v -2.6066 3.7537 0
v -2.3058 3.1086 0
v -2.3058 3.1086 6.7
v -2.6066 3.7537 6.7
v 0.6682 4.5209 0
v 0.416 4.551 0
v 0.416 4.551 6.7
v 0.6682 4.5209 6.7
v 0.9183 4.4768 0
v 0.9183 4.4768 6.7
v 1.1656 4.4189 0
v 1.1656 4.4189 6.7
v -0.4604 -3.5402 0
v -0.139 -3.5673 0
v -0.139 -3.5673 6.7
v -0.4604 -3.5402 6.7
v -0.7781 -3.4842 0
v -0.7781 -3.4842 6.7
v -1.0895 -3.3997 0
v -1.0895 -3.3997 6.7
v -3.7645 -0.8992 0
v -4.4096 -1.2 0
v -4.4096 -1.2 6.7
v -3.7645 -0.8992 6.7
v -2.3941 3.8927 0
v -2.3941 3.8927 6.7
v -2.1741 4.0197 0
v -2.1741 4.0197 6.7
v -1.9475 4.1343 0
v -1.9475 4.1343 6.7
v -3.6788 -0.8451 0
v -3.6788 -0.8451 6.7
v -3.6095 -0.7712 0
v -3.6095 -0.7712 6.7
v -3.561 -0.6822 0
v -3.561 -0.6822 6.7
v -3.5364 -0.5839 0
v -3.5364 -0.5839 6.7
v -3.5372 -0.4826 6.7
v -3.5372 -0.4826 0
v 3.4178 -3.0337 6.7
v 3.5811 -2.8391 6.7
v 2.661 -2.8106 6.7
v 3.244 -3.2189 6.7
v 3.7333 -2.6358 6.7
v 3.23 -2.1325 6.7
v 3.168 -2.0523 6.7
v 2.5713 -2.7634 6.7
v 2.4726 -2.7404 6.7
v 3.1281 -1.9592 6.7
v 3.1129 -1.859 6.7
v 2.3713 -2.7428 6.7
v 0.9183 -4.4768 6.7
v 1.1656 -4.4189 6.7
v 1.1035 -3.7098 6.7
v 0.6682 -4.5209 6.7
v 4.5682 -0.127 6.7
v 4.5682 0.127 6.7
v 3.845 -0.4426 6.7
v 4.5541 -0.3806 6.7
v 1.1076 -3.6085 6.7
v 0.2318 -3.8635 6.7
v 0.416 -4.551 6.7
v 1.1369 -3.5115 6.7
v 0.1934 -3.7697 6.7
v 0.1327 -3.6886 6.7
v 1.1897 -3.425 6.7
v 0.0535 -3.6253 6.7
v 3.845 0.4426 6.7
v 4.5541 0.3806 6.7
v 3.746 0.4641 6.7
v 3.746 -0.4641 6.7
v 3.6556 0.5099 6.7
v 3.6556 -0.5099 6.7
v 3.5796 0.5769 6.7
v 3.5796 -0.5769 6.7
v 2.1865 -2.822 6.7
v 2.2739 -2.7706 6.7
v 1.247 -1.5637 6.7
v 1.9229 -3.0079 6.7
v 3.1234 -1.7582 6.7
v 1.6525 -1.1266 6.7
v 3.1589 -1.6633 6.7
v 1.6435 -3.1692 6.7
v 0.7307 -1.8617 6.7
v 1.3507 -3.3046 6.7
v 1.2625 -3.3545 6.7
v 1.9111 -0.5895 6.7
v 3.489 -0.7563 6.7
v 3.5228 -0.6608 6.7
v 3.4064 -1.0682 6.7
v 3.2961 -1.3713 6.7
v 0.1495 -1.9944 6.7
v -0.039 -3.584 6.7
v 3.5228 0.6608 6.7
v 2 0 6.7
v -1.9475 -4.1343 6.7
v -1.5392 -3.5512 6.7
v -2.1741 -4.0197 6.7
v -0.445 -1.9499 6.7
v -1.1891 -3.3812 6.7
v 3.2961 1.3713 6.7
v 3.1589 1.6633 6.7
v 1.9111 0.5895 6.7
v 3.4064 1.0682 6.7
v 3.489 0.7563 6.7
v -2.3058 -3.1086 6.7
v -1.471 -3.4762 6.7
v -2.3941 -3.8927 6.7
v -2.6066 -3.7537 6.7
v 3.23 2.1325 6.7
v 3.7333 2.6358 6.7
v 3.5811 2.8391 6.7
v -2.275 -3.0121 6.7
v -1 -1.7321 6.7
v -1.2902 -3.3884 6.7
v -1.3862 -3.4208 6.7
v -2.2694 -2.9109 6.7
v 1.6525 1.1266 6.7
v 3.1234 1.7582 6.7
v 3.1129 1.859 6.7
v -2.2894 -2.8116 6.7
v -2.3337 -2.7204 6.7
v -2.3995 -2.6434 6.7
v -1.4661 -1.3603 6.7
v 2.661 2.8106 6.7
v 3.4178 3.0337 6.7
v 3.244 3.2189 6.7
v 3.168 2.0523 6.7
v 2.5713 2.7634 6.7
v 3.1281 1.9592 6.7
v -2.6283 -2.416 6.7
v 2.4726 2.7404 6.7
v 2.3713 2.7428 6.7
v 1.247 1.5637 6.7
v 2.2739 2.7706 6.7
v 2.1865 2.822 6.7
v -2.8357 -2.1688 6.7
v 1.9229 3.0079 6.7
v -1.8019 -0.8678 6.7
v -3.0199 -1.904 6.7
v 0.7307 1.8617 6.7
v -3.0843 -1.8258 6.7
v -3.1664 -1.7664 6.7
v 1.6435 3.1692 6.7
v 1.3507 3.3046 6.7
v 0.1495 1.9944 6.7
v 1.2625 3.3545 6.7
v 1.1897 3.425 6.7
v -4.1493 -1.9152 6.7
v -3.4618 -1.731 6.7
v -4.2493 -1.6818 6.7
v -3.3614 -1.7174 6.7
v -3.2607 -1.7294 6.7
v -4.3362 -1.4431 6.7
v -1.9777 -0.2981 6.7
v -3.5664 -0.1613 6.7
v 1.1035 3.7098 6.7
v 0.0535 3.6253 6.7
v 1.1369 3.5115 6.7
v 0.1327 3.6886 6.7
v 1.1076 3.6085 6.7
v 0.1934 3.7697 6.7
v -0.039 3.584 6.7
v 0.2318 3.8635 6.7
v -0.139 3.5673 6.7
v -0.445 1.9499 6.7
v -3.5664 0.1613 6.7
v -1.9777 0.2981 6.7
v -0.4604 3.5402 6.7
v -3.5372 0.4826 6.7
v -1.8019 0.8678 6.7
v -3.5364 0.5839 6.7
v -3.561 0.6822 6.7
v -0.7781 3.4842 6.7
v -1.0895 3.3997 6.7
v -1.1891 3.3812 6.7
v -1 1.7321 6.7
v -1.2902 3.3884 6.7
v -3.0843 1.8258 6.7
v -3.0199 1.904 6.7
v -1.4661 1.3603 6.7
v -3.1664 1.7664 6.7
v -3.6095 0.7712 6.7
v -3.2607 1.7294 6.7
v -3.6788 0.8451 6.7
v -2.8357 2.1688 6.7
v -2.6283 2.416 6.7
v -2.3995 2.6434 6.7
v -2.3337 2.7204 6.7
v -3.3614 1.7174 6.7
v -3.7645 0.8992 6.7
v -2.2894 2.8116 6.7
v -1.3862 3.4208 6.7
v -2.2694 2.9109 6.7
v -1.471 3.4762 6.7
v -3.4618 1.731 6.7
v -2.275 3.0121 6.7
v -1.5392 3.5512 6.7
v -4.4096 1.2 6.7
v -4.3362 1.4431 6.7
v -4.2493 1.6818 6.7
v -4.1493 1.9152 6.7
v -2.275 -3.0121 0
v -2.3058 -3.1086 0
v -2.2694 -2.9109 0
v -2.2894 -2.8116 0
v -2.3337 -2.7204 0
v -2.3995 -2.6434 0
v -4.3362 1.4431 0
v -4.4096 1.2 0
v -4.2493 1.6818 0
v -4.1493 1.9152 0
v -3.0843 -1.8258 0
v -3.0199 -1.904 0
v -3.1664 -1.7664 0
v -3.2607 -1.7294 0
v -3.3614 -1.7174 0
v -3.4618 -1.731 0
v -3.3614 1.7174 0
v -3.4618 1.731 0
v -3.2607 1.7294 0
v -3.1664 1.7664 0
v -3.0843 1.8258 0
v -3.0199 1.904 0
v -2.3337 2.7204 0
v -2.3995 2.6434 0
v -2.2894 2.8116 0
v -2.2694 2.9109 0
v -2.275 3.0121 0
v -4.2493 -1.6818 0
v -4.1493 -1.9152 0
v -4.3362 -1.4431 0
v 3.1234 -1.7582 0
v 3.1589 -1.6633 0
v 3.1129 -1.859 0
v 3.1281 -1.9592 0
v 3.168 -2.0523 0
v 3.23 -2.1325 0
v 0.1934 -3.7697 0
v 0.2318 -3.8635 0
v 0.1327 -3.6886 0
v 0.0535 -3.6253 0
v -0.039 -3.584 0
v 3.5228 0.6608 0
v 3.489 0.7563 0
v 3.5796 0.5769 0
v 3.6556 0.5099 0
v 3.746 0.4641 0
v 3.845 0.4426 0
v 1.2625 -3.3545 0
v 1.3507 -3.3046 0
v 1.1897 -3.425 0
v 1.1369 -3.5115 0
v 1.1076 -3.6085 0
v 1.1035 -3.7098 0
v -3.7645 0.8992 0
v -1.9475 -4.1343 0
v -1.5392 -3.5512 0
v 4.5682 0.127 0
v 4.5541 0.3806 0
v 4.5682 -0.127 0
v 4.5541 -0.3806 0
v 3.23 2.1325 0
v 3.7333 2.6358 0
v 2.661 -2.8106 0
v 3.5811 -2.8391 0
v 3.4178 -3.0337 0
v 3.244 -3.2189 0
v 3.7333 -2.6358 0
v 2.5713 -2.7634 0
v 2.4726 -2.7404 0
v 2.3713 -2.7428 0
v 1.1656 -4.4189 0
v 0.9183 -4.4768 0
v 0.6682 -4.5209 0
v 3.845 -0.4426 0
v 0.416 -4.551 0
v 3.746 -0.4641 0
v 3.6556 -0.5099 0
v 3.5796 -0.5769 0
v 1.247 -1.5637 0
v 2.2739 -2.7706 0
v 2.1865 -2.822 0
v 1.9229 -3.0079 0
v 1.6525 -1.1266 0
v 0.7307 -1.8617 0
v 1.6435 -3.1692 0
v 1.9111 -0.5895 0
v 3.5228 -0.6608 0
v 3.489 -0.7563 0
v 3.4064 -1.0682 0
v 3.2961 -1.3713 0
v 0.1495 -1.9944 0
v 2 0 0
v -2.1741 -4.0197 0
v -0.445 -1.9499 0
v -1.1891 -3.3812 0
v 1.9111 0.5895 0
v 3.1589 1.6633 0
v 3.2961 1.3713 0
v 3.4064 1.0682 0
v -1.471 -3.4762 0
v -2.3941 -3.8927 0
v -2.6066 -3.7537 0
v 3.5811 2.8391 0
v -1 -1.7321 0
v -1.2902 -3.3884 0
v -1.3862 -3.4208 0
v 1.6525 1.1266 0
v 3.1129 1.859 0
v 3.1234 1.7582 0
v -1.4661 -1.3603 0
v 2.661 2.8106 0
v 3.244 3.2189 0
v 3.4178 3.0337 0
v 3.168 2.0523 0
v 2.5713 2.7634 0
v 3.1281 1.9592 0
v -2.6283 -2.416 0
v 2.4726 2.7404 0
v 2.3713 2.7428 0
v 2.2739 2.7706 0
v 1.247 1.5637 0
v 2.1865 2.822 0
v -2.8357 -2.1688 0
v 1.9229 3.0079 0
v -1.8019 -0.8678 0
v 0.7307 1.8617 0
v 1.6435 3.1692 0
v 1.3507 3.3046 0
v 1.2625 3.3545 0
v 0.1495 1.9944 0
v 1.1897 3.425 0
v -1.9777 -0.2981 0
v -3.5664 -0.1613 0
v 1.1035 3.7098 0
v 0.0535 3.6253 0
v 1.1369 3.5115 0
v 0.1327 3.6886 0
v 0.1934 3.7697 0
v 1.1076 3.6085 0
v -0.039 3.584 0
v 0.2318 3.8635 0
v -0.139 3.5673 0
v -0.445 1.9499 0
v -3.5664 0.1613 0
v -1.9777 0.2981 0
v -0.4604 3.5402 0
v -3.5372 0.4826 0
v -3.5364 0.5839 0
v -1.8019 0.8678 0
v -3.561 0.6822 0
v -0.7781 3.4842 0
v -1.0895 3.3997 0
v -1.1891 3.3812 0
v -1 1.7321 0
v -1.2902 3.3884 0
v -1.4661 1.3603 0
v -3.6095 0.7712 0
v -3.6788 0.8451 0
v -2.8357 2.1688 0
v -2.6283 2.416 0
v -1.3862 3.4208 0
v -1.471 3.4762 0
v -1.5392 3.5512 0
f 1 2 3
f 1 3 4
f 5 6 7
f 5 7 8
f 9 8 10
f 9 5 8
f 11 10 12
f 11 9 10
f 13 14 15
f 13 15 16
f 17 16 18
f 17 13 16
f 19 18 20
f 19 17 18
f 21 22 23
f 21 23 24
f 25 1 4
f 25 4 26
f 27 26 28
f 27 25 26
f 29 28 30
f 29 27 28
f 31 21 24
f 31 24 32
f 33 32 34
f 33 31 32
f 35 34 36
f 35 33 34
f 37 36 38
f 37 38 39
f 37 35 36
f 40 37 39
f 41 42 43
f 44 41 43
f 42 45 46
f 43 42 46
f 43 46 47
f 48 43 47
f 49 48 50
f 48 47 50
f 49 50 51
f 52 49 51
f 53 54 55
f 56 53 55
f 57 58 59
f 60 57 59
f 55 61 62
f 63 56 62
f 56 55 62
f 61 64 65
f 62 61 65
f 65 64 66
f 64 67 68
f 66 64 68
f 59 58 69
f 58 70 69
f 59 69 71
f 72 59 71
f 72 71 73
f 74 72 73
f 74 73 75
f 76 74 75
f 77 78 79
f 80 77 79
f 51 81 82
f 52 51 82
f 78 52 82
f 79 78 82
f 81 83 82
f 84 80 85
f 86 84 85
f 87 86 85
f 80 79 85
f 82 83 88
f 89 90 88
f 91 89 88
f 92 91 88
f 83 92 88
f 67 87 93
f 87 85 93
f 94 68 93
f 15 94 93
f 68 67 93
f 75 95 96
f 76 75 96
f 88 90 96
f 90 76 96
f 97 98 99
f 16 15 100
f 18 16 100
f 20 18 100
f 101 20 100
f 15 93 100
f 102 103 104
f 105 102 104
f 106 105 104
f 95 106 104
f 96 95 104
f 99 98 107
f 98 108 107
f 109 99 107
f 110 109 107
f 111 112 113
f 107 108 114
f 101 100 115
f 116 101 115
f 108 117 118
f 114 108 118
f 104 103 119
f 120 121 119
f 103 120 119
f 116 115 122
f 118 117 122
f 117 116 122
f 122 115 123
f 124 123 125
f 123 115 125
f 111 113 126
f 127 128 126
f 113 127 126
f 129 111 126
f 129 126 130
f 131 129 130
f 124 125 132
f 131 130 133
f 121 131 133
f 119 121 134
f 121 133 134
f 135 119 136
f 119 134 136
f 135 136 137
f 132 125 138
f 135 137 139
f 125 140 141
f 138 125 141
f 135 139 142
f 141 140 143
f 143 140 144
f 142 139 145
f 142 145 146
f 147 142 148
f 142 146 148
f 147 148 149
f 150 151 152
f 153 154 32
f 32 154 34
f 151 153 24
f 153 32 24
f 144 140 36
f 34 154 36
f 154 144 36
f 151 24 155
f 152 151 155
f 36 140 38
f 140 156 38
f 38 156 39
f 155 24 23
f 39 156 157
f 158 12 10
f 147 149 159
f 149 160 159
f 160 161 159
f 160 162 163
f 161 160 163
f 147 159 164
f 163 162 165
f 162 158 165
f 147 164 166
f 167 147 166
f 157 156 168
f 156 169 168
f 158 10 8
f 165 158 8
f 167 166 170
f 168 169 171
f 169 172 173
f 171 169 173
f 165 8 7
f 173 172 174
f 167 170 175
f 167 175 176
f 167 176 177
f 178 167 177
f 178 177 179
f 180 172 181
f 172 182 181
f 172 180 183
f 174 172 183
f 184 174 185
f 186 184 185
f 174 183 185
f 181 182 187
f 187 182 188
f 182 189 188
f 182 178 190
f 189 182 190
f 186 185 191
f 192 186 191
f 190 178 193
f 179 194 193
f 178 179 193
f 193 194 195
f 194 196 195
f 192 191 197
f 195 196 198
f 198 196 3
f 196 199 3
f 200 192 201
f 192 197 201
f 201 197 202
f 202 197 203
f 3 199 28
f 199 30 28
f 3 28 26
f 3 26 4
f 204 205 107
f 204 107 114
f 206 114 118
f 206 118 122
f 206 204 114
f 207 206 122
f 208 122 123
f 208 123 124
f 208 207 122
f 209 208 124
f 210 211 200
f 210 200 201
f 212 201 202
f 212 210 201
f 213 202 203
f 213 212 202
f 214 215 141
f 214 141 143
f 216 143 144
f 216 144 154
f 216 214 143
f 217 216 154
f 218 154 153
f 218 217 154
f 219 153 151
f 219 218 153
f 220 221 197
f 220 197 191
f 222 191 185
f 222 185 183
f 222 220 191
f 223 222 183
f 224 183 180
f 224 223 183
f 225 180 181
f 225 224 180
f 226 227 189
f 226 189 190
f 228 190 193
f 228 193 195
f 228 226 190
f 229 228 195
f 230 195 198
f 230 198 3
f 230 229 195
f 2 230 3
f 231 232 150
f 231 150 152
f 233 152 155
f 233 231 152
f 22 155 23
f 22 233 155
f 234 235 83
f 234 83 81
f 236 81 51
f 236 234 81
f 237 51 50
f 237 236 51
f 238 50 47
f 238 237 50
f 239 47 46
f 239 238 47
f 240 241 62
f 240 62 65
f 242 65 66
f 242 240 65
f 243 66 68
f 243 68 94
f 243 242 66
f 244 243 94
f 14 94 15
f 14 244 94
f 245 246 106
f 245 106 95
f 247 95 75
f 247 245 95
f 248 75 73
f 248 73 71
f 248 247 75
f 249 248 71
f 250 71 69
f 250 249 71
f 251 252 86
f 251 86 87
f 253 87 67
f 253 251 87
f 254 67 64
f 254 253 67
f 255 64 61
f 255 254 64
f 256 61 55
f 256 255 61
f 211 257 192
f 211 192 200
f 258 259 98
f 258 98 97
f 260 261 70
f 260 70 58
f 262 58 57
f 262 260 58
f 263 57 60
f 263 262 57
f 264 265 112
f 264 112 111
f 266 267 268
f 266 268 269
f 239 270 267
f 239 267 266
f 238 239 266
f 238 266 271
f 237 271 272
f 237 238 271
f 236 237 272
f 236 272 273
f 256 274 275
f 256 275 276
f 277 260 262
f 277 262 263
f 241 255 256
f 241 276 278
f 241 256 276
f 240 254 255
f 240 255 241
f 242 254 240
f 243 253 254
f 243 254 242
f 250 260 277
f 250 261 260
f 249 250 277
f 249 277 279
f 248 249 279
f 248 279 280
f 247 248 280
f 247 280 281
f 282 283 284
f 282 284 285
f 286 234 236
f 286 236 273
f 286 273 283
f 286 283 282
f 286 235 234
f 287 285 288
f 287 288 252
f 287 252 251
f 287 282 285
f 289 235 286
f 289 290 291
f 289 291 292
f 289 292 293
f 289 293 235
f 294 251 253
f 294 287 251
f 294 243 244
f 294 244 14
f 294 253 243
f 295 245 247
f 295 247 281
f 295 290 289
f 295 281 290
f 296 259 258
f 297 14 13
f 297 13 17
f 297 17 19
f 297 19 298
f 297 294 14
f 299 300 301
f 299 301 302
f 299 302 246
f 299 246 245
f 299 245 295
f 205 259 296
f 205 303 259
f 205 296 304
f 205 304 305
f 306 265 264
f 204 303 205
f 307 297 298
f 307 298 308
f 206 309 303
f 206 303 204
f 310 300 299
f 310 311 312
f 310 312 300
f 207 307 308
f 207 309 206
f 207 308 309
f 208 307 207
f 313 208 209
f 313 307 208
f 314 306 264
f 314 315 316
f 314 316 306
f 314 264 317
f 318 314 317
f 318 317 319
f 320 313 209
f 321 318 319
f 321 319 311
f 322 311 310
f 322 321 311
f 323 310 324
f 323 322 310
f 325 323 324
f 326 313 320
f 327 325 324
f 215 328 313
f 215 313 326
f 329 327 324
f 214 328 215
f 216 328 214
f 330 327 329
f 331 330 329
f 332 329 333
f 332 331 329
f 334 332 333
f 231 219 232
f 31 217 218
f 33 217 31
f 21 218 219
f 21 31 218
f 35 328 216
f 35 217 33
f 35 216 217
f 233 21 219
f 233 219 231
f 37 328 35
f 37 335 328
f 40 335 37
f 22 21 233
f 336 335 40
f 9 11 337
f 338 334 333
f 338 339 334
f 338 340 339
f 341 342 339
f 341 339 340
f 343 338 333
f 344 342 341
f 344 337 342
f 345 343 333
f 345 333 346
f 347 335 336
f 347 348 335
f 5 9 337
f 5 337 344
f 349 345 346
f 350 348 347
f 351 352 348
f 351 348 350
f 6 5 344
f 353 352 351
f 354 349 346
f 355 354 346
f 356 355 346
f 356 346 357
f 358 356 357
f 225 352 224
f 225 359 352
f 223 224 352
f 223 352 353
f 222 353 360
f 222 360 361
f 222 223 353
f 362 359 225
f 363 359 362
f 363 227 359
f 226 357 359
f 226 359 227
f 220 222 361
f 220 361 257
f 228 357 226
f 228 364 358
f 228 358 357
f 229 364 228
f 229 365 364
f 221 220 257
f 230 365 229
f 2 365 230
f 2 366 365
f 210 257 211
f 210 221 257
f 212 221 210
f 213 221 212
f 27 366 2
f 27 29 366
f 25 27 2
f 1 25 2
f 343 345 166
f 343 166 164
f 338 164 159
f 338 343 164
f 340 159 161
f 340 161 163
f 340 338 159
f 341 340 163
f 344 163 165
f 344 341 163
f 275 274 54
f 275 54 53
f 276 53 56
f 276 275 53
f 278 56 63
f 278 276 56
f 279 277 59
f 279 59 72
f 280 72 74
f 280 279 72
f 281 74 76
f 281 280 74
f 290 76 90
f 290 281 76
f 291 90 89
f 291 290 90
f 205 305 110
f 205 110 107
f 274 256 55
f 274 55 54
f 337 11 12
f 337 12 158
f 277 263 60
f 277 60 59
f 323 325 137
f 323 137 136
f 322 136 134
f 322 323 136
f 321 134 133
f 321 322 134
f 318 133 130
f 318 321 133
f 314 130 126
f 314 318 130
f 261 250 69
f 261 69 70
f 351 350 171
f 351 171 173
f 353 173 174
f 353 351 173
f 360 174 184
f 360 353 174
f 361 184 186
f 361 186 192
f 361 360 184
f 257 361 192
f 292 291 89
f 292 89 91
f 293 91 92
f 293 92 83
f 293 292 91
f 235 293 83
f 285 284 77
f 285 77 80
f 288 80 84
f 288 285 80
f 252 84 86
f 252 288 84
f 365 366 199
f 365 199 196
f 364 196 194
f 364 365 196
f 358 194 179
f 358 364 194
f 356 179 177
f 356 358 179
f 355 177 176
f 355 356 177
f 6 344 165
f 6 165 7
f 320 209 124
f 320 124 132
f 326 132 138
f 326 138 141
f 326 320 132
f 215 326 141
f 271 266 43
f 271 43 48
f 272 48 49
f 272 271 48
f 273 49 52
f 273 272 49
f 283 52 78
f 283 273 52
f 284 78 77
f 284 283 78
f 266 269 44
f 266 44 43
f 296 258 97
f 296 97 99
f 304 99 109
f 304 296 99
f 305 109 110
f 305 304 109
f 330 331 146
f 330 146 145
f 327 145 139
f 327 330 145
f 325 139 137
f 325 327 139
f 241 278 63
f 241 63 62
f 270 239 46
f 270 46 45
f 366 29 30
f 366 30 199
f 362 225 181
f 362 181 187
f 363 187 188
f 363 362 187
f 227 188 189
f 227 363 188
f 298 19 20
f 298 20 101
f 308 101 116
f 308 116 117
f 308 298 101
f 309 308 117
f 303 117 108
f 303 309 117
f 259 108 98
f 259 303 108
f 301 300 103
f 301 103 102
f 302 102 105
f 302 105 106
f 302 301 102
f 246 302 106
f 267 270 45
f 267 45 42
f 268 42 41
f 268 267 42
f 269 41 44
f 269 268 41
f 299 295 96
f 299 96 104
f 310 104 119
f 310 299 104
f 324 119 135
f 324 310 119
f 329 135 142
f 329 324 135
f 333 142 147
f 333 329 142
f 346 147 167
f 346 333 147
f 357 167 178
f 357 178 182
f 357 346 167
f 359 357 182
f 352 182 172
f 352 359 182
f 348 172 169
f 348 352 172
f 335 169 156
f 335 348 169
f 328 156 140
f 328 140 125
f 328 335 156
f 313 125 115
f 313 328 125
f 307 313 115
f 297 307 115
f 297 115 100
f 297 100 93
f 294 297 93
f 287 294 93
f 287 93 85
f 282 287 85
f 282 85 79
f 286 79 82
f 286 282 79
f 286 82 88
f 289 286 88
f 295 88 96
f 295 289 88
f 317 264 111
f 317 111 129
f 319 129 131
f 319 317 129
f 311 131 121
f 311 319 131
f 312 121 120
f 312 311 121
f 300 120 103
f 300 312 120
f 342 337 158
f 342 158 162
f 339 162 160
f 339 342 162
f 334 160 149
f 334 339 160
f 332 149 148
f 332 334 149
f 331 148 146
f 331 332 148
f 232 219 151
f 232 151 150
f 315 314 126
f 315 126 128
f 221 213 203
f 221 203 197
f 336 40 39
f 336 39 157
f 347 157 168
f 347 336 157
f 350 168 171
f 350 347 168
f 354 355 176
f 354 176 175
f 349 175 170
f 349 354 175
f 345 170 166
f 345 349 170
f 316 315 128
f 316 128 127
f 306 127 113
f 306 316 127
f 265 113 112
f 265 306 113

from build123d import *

# Parameters (mm, degrees)
SKETCH2_R           = 2
BOSS_EXTRUDE1_DEPTH = 6.7


with BuildPart() as part:
    # Sketch2 → Boss-Extrude1 (new body)
    with BuildSketch(Plane.XY):
        with BuildLine():
            Line((-4.409637173, -1.2), (-3.764514138, -0.899174188))
            ThreePointArc((-3.764514138, -0.899174188), (-3.582420347, -0.728223333), (-3.537232834, -0.482580436))
            ThreePointArc((-3.537232834, -0.482580436), (-3.57, 0), (-3.537232834, 0.482580436))
            ThreePointArc((-3.537232834, 0.482580436), (-3.582420347, 0.728223333), (-3.764514138, 0.899174188))
            Line((-3.764514138, 0.899174188), (-4.409637173, 1.2))
            ThreePointArc((-4.409637173, 1.2), (-4.294395277, 1.563032055), (-4.149323184, 1.915206806))
            Line((-4.149323184, 1.915206806), (-3.461763164, 1.730975654))
            ThreePointArc((-3.461763164, 1.730975654), (-3.212386135, 1.744883974), (-3.019874282, 1.904011377))
            ThreePointArc((-3.019874282, 1.904011377), (-2.734778662, 2.294751767), (-2.399480831, 2.6433675))
            ThreePointArc((-2.399480831, 2.6433675), (-2.276200264, 2.860586849), (-2.305807109, 3.108590435))
            Line((-2.305807109, 3.108590435), (-2.606632921, 3.75371347))
            ThreePointArc((-2.606632921, 3.75371347), (-2.285, 3.957736095), (-1.947494763, 4.134267063))
            Line((-1.947494763, 4.134267063), (-1.539214732, 3.55118275))
            ThreePointArc((-1.539214732, 3.55118275), (-1.339240749, 3.401540677), (-1.089482991, 3.399695106))
            ThreePointArc((-1.089482991, 3.399695106), (-0.619923994, 3.515763678), (-0.13898508, 3.567293533))
            ThreePointArc((-0.13898508, 3.567293533), (0.095079219, 3.654449987), (0.231812692, 3.863462669))
            Line((0.231812692, 3.863462669), (0.416043844, 4.551022689))
            ThreePointArc((0.416043844, 4.551022689), (0.793572172, 4.500571431), (1.165588102, 4.418857814))
            Line((1.165588102, 4.418857814), (1.10354938, 3.709751971))
            ThreePointArc((1.10354938, 3.709751971), (1.160550267, 3.466578694), (1.3506895, 3.304623712))
            ThreePointArc((1.3506895, 3.304623712), (1.785, 3.091710692), (2.186543334, 2.822043275))
            ThreePointArc((2.186543334, 2.822043275), (2.421870079, 2.738355361), (2.660964759, 2.810577782))
            Line((2.660964759, 2.810577782), (3.244049071, 3.218857814))
            ThreePointArc((3.244049071, 3.218857814), (3.500823105, 2.937539376), (3.73327934, 2.635815883))
            Line((3.73327934, 2.635815883), (3.229950472, 2.132487015))
            ThreePointArc((3.229950472, 2.132487015), (3.117306916, 1.909566013), (3.158859362, 1.663282156))
            ThreePointArc((3.158859362, 1.663282156), (3.354702656, 1.221011912), (3.488963822, 0.756327606))
            ThreePointArc((3.488963822, 0.756327606), (3.615441013, 0.540953828), (3.845021841, 0.442592316))
            Line((3.845021841, 0.442592316), (4.554127684, 0.380553593))
            ThreePointArc((4.554127684, 0.380553593), (4.57, 0), (4.554127684, -0.380553593))
            Line((4.554127684, -0.380553593), (3.845021841, -0.442592316))
            ThreePointArc((3.845021841, -0.442592316), (3.615441013, -0.540953828), (3.488963822, -0.756327606))
            ThreePointArc((3.488963822, -0.756327606), (3.354702656, -1.221011912), (3.158859362, -1.663282156))
            ThreePointArc((3.158859362, -1.663282156), (3.117306916, -1.909566013), (3.229950472, -2.132487015))
            Line((3.229950472, -2.132487015), (3.73327934, -2.635815883))
            ThreePointArc((3.73327934, -2.635815883), (3.500823105, -2.937539376), (3.244049071, -3.218857814))
            Line((3.244049071, -3.218857814), (2.660964759, -2.810577782))
            ThreePointArc((2.660964759, -2.810577782), (2.421870079, -2.738355361), (2.186543334, -2.822043275))
            ThreePointArc((2.186543334, -2.822043275), (1.785, -3.091710692), (1.3506895, -3.304623712))
            ThreePointArc((1.3506895, -3.304623712), (1.160550267, -3.466578694), (1.10354938, -3.709751971))
            Line((1.10354938, -3.709751971), (1.165588102, -4.418857814))
            ThreePointArc((1.165588102, -4.418857814), (0.793572172, -4.500571431), (0.416043844, -4.551022689))
            Line((0.416043844, -4.551022689), (0.231812692, -3.863462669))
            ThreePointArc((0.231812692, -3.863462669), (0.095079219, -3.654449987), (-0.13898508, -3.567293533))
            ThreePointArc((-0.13898508, -3.567293533), (-0.619923994, -3.515763678), (-1.089482991, -3.399695106))
            ThreePointArc((-1.089482991, -3.399695106), (-1.339240749, -3.401540677), (-1.539214732, -3.55118275))
            Line((-1.539214732, -3.55118275), (-1.947494763, -4.134267063))
            ThreePointArc((-1.947494763, -4.134267063), (-2.285, -3.957736095), (-2.606632921, -3.75371347))
            Line((-2.606632921, -3.75371347), (-2.305807109, -3.108590435))
            ThreePointArc((-2.305807109, -3.108590435), (-2.276200264, -2.860586849), (-2.399480831, -2.6433675))
            ThreePointArc((-2.399480831, -2.6433675), (-2.734778662, -2.294751767), (-3.019874282, -1.904011377))
            ThreePointArc((-3.019874282, -1.904011377), (-3.212386135, -1.744883974), (-3.461763164, -1.730975654))
            Line((-3.461763164, -1.730975654), (-4.149323184, -1.915206806))
            ThreePointArc((-4.149323184, -1.915206806), (-4.294395277, -1.563032055), (-4.409637173, -1.2))
        make_face()
        Circle(SKETCH2_R, mode=Mode.SUBTRACT)
    extrude(amount=BOSS_EXTRUDE1_DEPTH)


solid = part.part
